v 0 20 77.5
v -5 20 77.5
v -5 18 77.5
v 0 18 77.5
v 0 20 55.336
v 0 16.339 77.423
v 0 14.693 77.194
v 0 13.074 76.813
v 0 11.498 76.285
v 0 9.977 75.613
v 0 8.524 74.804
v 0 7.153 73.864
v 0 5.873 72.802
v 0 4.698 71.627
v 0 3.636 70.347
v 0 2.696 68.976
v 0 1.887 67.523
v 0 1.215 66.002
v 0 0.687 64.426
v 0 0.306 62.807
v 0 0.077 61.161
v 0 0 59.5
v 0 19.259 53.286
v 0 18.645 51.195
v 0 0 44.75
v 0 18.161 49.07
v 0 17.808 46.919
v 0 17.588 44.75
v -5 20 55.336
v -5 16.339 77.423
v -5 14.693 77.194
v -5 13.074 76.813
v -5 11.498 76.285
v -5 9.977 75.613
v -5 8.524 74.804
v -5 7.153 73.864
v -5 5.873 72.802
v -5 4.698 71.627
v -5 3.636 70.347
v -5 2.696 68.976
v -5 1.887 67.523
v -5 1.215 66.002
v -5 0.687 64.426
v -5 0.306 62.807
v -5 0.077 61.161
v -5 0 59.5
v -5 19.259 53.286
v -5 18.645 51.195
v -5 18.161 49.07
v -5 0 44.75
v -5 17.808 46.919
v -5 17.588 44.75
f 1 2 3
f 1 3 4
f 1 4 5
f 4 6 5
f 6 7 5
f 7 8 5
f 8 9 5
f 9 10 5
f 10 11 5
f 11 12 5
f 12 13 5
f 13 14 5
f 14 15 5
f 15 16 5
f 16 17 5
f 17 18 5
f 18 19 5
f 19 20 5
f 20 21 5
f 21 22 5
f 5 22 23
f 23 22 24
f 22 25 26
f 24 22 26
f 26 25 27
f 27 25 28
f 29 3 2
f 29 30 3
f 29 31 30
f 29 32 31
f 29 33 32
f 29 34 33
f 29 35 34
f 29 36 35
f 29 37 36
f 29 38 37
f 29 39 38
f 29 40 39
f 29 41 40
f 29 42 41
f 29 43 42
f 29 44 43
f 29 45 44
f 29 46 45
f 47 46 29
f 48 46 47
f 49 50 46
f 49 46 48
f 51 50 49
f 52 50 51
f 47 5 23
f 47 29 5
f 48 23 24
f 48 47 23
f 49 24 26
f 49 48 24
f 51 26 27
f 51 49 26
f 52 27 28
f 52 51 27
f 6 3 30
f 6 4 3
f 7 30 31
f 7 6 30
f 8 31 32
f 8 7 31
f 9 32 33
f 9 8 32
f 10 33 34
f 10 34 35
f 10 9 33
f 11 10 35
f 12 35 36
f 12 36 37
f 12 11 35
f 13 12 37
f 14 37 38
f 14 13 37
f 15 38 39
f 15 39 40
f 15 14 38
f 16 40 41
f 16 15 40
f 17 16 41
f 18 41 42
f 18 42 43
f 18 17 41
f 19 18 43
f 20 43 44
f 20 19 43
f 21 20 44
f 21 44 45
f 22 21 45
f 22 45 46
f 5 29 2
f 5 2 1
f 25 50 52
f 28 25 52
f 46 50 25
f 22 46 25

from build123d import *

# Parameters (mm, degrees)
SKETCH1_W               = 5
SKETCH1_H               = 20
BOSS_EXTRUDE1_DEPTH     = 84.5
CUT_EXTRUDE2_DEPTH      = 35
CUT_EXTRUDE2_DEPTH_BACK = 35
SKETCH5_R               = 35.5
SKETCH2_W               = 5
SKETCH2_H               = 20
CUT_EXTRUDE3_DEPTH      = 13
SKETCH8_W               = 39.75
SKETCH8_H               = 20
CUT_EXTRUDE4_DEPTH      = 13
SKETCH9_W               = 5
SKETCH9_H               = 7
CUT_EXTRUDE5_DEPTH      = 24
FILLET1_R               = 18


with BuildPart() as part:
    # Sketch1 → Boss-Extrude1 (new body)
    with BuildSketch(Plane.XY):
        with Locations((-2.5, 10)):
            Rectangle(SKETCH1_W, SKETCH1_H)
    extrude(amount=BOSS_EXTRUDE1_DEPTH)

    # Sketch5 → Cut-Extrude2 (cut, two sides: drawn at the far end of the back side and taken through both)
    with BuildSketch(Plane(origin=(0, 0, 0), x_dir=(0, 0, -1), z_dir=(1, 0, 0)).offset(-CUT_EXTRUDE2_DEPTH_BACK)):
        with Locations((-42.25, 53)):
            Circle(SKETCH5_R)
    extrude(amount=CUT_EXTRUDE2_DEPTH + CUT_EXTRUDE2_DEPTH_BACK, mode=Mode.SUBTRACT)

    # Sketch2 → Cut-Extrude3 (cut)
    with BuildSketch(Plane.ZY.offset(5)):
        with Locations((42.25, 10)):
            Rectangle(SKETCH2_W, SKETCH2_H)
    extrude(amount=-CUT_EXTRUDE3_DEPTH, mode=Mode.SUBTRACT)


with BuildPart() as cut_extrude3_piece_1:
    # of the separate pieces the step leaves, piece 1, a body of its own (cut_extrude3_pieces)
    add(part.part.solids().sort_by_distance((0, 0, 44.75))[0])

    # Sketch9 → Cut-Extrude5 (cut)
    with BuildSketch(Plane(origin=(0, 20, 0), x_dir=(1, 0, 0), z_dir=(0, 1, 0))):
        with Locations((-2.5, -81)):
            Rectangle(SKETCH9_W, SKETCH9_H)
    extrude(amount=-CUT_EXTRUDE5_DEPTH, mode=Mode.SUBTRACT)

    # Fillet1
    fillet1_edges = [cut_extrude3_piece_1.edges().sort_by_distance(p)[0] for p in [
        (-2.5, 0, 77.5),
    ]]
    fillet(fillet1_edges, radius=FILLET1_R)


with BuildPart() as cut_extrude3_piece_2:
    # of the separate pieces the step leaves, piece 2, a body of its own (cut_extrude3_pieces)
    add(part.part.solids().sort_by_distance((-5, 20, 0))[0])

    # Sketch8 → Cut-Extrude4 (cut)
    with BuildSketch(Plane.ZY.offset(5)):
        with Locations((19.875, 10)):
            Rectangle(SKETCH8_W, SKETCH8_H)
    extrude(amount=-CUT_EXTRUDE4_DEPTH, mode=Mode.SUBTRACT)


solid = cut_extrude3_piece_1.part
